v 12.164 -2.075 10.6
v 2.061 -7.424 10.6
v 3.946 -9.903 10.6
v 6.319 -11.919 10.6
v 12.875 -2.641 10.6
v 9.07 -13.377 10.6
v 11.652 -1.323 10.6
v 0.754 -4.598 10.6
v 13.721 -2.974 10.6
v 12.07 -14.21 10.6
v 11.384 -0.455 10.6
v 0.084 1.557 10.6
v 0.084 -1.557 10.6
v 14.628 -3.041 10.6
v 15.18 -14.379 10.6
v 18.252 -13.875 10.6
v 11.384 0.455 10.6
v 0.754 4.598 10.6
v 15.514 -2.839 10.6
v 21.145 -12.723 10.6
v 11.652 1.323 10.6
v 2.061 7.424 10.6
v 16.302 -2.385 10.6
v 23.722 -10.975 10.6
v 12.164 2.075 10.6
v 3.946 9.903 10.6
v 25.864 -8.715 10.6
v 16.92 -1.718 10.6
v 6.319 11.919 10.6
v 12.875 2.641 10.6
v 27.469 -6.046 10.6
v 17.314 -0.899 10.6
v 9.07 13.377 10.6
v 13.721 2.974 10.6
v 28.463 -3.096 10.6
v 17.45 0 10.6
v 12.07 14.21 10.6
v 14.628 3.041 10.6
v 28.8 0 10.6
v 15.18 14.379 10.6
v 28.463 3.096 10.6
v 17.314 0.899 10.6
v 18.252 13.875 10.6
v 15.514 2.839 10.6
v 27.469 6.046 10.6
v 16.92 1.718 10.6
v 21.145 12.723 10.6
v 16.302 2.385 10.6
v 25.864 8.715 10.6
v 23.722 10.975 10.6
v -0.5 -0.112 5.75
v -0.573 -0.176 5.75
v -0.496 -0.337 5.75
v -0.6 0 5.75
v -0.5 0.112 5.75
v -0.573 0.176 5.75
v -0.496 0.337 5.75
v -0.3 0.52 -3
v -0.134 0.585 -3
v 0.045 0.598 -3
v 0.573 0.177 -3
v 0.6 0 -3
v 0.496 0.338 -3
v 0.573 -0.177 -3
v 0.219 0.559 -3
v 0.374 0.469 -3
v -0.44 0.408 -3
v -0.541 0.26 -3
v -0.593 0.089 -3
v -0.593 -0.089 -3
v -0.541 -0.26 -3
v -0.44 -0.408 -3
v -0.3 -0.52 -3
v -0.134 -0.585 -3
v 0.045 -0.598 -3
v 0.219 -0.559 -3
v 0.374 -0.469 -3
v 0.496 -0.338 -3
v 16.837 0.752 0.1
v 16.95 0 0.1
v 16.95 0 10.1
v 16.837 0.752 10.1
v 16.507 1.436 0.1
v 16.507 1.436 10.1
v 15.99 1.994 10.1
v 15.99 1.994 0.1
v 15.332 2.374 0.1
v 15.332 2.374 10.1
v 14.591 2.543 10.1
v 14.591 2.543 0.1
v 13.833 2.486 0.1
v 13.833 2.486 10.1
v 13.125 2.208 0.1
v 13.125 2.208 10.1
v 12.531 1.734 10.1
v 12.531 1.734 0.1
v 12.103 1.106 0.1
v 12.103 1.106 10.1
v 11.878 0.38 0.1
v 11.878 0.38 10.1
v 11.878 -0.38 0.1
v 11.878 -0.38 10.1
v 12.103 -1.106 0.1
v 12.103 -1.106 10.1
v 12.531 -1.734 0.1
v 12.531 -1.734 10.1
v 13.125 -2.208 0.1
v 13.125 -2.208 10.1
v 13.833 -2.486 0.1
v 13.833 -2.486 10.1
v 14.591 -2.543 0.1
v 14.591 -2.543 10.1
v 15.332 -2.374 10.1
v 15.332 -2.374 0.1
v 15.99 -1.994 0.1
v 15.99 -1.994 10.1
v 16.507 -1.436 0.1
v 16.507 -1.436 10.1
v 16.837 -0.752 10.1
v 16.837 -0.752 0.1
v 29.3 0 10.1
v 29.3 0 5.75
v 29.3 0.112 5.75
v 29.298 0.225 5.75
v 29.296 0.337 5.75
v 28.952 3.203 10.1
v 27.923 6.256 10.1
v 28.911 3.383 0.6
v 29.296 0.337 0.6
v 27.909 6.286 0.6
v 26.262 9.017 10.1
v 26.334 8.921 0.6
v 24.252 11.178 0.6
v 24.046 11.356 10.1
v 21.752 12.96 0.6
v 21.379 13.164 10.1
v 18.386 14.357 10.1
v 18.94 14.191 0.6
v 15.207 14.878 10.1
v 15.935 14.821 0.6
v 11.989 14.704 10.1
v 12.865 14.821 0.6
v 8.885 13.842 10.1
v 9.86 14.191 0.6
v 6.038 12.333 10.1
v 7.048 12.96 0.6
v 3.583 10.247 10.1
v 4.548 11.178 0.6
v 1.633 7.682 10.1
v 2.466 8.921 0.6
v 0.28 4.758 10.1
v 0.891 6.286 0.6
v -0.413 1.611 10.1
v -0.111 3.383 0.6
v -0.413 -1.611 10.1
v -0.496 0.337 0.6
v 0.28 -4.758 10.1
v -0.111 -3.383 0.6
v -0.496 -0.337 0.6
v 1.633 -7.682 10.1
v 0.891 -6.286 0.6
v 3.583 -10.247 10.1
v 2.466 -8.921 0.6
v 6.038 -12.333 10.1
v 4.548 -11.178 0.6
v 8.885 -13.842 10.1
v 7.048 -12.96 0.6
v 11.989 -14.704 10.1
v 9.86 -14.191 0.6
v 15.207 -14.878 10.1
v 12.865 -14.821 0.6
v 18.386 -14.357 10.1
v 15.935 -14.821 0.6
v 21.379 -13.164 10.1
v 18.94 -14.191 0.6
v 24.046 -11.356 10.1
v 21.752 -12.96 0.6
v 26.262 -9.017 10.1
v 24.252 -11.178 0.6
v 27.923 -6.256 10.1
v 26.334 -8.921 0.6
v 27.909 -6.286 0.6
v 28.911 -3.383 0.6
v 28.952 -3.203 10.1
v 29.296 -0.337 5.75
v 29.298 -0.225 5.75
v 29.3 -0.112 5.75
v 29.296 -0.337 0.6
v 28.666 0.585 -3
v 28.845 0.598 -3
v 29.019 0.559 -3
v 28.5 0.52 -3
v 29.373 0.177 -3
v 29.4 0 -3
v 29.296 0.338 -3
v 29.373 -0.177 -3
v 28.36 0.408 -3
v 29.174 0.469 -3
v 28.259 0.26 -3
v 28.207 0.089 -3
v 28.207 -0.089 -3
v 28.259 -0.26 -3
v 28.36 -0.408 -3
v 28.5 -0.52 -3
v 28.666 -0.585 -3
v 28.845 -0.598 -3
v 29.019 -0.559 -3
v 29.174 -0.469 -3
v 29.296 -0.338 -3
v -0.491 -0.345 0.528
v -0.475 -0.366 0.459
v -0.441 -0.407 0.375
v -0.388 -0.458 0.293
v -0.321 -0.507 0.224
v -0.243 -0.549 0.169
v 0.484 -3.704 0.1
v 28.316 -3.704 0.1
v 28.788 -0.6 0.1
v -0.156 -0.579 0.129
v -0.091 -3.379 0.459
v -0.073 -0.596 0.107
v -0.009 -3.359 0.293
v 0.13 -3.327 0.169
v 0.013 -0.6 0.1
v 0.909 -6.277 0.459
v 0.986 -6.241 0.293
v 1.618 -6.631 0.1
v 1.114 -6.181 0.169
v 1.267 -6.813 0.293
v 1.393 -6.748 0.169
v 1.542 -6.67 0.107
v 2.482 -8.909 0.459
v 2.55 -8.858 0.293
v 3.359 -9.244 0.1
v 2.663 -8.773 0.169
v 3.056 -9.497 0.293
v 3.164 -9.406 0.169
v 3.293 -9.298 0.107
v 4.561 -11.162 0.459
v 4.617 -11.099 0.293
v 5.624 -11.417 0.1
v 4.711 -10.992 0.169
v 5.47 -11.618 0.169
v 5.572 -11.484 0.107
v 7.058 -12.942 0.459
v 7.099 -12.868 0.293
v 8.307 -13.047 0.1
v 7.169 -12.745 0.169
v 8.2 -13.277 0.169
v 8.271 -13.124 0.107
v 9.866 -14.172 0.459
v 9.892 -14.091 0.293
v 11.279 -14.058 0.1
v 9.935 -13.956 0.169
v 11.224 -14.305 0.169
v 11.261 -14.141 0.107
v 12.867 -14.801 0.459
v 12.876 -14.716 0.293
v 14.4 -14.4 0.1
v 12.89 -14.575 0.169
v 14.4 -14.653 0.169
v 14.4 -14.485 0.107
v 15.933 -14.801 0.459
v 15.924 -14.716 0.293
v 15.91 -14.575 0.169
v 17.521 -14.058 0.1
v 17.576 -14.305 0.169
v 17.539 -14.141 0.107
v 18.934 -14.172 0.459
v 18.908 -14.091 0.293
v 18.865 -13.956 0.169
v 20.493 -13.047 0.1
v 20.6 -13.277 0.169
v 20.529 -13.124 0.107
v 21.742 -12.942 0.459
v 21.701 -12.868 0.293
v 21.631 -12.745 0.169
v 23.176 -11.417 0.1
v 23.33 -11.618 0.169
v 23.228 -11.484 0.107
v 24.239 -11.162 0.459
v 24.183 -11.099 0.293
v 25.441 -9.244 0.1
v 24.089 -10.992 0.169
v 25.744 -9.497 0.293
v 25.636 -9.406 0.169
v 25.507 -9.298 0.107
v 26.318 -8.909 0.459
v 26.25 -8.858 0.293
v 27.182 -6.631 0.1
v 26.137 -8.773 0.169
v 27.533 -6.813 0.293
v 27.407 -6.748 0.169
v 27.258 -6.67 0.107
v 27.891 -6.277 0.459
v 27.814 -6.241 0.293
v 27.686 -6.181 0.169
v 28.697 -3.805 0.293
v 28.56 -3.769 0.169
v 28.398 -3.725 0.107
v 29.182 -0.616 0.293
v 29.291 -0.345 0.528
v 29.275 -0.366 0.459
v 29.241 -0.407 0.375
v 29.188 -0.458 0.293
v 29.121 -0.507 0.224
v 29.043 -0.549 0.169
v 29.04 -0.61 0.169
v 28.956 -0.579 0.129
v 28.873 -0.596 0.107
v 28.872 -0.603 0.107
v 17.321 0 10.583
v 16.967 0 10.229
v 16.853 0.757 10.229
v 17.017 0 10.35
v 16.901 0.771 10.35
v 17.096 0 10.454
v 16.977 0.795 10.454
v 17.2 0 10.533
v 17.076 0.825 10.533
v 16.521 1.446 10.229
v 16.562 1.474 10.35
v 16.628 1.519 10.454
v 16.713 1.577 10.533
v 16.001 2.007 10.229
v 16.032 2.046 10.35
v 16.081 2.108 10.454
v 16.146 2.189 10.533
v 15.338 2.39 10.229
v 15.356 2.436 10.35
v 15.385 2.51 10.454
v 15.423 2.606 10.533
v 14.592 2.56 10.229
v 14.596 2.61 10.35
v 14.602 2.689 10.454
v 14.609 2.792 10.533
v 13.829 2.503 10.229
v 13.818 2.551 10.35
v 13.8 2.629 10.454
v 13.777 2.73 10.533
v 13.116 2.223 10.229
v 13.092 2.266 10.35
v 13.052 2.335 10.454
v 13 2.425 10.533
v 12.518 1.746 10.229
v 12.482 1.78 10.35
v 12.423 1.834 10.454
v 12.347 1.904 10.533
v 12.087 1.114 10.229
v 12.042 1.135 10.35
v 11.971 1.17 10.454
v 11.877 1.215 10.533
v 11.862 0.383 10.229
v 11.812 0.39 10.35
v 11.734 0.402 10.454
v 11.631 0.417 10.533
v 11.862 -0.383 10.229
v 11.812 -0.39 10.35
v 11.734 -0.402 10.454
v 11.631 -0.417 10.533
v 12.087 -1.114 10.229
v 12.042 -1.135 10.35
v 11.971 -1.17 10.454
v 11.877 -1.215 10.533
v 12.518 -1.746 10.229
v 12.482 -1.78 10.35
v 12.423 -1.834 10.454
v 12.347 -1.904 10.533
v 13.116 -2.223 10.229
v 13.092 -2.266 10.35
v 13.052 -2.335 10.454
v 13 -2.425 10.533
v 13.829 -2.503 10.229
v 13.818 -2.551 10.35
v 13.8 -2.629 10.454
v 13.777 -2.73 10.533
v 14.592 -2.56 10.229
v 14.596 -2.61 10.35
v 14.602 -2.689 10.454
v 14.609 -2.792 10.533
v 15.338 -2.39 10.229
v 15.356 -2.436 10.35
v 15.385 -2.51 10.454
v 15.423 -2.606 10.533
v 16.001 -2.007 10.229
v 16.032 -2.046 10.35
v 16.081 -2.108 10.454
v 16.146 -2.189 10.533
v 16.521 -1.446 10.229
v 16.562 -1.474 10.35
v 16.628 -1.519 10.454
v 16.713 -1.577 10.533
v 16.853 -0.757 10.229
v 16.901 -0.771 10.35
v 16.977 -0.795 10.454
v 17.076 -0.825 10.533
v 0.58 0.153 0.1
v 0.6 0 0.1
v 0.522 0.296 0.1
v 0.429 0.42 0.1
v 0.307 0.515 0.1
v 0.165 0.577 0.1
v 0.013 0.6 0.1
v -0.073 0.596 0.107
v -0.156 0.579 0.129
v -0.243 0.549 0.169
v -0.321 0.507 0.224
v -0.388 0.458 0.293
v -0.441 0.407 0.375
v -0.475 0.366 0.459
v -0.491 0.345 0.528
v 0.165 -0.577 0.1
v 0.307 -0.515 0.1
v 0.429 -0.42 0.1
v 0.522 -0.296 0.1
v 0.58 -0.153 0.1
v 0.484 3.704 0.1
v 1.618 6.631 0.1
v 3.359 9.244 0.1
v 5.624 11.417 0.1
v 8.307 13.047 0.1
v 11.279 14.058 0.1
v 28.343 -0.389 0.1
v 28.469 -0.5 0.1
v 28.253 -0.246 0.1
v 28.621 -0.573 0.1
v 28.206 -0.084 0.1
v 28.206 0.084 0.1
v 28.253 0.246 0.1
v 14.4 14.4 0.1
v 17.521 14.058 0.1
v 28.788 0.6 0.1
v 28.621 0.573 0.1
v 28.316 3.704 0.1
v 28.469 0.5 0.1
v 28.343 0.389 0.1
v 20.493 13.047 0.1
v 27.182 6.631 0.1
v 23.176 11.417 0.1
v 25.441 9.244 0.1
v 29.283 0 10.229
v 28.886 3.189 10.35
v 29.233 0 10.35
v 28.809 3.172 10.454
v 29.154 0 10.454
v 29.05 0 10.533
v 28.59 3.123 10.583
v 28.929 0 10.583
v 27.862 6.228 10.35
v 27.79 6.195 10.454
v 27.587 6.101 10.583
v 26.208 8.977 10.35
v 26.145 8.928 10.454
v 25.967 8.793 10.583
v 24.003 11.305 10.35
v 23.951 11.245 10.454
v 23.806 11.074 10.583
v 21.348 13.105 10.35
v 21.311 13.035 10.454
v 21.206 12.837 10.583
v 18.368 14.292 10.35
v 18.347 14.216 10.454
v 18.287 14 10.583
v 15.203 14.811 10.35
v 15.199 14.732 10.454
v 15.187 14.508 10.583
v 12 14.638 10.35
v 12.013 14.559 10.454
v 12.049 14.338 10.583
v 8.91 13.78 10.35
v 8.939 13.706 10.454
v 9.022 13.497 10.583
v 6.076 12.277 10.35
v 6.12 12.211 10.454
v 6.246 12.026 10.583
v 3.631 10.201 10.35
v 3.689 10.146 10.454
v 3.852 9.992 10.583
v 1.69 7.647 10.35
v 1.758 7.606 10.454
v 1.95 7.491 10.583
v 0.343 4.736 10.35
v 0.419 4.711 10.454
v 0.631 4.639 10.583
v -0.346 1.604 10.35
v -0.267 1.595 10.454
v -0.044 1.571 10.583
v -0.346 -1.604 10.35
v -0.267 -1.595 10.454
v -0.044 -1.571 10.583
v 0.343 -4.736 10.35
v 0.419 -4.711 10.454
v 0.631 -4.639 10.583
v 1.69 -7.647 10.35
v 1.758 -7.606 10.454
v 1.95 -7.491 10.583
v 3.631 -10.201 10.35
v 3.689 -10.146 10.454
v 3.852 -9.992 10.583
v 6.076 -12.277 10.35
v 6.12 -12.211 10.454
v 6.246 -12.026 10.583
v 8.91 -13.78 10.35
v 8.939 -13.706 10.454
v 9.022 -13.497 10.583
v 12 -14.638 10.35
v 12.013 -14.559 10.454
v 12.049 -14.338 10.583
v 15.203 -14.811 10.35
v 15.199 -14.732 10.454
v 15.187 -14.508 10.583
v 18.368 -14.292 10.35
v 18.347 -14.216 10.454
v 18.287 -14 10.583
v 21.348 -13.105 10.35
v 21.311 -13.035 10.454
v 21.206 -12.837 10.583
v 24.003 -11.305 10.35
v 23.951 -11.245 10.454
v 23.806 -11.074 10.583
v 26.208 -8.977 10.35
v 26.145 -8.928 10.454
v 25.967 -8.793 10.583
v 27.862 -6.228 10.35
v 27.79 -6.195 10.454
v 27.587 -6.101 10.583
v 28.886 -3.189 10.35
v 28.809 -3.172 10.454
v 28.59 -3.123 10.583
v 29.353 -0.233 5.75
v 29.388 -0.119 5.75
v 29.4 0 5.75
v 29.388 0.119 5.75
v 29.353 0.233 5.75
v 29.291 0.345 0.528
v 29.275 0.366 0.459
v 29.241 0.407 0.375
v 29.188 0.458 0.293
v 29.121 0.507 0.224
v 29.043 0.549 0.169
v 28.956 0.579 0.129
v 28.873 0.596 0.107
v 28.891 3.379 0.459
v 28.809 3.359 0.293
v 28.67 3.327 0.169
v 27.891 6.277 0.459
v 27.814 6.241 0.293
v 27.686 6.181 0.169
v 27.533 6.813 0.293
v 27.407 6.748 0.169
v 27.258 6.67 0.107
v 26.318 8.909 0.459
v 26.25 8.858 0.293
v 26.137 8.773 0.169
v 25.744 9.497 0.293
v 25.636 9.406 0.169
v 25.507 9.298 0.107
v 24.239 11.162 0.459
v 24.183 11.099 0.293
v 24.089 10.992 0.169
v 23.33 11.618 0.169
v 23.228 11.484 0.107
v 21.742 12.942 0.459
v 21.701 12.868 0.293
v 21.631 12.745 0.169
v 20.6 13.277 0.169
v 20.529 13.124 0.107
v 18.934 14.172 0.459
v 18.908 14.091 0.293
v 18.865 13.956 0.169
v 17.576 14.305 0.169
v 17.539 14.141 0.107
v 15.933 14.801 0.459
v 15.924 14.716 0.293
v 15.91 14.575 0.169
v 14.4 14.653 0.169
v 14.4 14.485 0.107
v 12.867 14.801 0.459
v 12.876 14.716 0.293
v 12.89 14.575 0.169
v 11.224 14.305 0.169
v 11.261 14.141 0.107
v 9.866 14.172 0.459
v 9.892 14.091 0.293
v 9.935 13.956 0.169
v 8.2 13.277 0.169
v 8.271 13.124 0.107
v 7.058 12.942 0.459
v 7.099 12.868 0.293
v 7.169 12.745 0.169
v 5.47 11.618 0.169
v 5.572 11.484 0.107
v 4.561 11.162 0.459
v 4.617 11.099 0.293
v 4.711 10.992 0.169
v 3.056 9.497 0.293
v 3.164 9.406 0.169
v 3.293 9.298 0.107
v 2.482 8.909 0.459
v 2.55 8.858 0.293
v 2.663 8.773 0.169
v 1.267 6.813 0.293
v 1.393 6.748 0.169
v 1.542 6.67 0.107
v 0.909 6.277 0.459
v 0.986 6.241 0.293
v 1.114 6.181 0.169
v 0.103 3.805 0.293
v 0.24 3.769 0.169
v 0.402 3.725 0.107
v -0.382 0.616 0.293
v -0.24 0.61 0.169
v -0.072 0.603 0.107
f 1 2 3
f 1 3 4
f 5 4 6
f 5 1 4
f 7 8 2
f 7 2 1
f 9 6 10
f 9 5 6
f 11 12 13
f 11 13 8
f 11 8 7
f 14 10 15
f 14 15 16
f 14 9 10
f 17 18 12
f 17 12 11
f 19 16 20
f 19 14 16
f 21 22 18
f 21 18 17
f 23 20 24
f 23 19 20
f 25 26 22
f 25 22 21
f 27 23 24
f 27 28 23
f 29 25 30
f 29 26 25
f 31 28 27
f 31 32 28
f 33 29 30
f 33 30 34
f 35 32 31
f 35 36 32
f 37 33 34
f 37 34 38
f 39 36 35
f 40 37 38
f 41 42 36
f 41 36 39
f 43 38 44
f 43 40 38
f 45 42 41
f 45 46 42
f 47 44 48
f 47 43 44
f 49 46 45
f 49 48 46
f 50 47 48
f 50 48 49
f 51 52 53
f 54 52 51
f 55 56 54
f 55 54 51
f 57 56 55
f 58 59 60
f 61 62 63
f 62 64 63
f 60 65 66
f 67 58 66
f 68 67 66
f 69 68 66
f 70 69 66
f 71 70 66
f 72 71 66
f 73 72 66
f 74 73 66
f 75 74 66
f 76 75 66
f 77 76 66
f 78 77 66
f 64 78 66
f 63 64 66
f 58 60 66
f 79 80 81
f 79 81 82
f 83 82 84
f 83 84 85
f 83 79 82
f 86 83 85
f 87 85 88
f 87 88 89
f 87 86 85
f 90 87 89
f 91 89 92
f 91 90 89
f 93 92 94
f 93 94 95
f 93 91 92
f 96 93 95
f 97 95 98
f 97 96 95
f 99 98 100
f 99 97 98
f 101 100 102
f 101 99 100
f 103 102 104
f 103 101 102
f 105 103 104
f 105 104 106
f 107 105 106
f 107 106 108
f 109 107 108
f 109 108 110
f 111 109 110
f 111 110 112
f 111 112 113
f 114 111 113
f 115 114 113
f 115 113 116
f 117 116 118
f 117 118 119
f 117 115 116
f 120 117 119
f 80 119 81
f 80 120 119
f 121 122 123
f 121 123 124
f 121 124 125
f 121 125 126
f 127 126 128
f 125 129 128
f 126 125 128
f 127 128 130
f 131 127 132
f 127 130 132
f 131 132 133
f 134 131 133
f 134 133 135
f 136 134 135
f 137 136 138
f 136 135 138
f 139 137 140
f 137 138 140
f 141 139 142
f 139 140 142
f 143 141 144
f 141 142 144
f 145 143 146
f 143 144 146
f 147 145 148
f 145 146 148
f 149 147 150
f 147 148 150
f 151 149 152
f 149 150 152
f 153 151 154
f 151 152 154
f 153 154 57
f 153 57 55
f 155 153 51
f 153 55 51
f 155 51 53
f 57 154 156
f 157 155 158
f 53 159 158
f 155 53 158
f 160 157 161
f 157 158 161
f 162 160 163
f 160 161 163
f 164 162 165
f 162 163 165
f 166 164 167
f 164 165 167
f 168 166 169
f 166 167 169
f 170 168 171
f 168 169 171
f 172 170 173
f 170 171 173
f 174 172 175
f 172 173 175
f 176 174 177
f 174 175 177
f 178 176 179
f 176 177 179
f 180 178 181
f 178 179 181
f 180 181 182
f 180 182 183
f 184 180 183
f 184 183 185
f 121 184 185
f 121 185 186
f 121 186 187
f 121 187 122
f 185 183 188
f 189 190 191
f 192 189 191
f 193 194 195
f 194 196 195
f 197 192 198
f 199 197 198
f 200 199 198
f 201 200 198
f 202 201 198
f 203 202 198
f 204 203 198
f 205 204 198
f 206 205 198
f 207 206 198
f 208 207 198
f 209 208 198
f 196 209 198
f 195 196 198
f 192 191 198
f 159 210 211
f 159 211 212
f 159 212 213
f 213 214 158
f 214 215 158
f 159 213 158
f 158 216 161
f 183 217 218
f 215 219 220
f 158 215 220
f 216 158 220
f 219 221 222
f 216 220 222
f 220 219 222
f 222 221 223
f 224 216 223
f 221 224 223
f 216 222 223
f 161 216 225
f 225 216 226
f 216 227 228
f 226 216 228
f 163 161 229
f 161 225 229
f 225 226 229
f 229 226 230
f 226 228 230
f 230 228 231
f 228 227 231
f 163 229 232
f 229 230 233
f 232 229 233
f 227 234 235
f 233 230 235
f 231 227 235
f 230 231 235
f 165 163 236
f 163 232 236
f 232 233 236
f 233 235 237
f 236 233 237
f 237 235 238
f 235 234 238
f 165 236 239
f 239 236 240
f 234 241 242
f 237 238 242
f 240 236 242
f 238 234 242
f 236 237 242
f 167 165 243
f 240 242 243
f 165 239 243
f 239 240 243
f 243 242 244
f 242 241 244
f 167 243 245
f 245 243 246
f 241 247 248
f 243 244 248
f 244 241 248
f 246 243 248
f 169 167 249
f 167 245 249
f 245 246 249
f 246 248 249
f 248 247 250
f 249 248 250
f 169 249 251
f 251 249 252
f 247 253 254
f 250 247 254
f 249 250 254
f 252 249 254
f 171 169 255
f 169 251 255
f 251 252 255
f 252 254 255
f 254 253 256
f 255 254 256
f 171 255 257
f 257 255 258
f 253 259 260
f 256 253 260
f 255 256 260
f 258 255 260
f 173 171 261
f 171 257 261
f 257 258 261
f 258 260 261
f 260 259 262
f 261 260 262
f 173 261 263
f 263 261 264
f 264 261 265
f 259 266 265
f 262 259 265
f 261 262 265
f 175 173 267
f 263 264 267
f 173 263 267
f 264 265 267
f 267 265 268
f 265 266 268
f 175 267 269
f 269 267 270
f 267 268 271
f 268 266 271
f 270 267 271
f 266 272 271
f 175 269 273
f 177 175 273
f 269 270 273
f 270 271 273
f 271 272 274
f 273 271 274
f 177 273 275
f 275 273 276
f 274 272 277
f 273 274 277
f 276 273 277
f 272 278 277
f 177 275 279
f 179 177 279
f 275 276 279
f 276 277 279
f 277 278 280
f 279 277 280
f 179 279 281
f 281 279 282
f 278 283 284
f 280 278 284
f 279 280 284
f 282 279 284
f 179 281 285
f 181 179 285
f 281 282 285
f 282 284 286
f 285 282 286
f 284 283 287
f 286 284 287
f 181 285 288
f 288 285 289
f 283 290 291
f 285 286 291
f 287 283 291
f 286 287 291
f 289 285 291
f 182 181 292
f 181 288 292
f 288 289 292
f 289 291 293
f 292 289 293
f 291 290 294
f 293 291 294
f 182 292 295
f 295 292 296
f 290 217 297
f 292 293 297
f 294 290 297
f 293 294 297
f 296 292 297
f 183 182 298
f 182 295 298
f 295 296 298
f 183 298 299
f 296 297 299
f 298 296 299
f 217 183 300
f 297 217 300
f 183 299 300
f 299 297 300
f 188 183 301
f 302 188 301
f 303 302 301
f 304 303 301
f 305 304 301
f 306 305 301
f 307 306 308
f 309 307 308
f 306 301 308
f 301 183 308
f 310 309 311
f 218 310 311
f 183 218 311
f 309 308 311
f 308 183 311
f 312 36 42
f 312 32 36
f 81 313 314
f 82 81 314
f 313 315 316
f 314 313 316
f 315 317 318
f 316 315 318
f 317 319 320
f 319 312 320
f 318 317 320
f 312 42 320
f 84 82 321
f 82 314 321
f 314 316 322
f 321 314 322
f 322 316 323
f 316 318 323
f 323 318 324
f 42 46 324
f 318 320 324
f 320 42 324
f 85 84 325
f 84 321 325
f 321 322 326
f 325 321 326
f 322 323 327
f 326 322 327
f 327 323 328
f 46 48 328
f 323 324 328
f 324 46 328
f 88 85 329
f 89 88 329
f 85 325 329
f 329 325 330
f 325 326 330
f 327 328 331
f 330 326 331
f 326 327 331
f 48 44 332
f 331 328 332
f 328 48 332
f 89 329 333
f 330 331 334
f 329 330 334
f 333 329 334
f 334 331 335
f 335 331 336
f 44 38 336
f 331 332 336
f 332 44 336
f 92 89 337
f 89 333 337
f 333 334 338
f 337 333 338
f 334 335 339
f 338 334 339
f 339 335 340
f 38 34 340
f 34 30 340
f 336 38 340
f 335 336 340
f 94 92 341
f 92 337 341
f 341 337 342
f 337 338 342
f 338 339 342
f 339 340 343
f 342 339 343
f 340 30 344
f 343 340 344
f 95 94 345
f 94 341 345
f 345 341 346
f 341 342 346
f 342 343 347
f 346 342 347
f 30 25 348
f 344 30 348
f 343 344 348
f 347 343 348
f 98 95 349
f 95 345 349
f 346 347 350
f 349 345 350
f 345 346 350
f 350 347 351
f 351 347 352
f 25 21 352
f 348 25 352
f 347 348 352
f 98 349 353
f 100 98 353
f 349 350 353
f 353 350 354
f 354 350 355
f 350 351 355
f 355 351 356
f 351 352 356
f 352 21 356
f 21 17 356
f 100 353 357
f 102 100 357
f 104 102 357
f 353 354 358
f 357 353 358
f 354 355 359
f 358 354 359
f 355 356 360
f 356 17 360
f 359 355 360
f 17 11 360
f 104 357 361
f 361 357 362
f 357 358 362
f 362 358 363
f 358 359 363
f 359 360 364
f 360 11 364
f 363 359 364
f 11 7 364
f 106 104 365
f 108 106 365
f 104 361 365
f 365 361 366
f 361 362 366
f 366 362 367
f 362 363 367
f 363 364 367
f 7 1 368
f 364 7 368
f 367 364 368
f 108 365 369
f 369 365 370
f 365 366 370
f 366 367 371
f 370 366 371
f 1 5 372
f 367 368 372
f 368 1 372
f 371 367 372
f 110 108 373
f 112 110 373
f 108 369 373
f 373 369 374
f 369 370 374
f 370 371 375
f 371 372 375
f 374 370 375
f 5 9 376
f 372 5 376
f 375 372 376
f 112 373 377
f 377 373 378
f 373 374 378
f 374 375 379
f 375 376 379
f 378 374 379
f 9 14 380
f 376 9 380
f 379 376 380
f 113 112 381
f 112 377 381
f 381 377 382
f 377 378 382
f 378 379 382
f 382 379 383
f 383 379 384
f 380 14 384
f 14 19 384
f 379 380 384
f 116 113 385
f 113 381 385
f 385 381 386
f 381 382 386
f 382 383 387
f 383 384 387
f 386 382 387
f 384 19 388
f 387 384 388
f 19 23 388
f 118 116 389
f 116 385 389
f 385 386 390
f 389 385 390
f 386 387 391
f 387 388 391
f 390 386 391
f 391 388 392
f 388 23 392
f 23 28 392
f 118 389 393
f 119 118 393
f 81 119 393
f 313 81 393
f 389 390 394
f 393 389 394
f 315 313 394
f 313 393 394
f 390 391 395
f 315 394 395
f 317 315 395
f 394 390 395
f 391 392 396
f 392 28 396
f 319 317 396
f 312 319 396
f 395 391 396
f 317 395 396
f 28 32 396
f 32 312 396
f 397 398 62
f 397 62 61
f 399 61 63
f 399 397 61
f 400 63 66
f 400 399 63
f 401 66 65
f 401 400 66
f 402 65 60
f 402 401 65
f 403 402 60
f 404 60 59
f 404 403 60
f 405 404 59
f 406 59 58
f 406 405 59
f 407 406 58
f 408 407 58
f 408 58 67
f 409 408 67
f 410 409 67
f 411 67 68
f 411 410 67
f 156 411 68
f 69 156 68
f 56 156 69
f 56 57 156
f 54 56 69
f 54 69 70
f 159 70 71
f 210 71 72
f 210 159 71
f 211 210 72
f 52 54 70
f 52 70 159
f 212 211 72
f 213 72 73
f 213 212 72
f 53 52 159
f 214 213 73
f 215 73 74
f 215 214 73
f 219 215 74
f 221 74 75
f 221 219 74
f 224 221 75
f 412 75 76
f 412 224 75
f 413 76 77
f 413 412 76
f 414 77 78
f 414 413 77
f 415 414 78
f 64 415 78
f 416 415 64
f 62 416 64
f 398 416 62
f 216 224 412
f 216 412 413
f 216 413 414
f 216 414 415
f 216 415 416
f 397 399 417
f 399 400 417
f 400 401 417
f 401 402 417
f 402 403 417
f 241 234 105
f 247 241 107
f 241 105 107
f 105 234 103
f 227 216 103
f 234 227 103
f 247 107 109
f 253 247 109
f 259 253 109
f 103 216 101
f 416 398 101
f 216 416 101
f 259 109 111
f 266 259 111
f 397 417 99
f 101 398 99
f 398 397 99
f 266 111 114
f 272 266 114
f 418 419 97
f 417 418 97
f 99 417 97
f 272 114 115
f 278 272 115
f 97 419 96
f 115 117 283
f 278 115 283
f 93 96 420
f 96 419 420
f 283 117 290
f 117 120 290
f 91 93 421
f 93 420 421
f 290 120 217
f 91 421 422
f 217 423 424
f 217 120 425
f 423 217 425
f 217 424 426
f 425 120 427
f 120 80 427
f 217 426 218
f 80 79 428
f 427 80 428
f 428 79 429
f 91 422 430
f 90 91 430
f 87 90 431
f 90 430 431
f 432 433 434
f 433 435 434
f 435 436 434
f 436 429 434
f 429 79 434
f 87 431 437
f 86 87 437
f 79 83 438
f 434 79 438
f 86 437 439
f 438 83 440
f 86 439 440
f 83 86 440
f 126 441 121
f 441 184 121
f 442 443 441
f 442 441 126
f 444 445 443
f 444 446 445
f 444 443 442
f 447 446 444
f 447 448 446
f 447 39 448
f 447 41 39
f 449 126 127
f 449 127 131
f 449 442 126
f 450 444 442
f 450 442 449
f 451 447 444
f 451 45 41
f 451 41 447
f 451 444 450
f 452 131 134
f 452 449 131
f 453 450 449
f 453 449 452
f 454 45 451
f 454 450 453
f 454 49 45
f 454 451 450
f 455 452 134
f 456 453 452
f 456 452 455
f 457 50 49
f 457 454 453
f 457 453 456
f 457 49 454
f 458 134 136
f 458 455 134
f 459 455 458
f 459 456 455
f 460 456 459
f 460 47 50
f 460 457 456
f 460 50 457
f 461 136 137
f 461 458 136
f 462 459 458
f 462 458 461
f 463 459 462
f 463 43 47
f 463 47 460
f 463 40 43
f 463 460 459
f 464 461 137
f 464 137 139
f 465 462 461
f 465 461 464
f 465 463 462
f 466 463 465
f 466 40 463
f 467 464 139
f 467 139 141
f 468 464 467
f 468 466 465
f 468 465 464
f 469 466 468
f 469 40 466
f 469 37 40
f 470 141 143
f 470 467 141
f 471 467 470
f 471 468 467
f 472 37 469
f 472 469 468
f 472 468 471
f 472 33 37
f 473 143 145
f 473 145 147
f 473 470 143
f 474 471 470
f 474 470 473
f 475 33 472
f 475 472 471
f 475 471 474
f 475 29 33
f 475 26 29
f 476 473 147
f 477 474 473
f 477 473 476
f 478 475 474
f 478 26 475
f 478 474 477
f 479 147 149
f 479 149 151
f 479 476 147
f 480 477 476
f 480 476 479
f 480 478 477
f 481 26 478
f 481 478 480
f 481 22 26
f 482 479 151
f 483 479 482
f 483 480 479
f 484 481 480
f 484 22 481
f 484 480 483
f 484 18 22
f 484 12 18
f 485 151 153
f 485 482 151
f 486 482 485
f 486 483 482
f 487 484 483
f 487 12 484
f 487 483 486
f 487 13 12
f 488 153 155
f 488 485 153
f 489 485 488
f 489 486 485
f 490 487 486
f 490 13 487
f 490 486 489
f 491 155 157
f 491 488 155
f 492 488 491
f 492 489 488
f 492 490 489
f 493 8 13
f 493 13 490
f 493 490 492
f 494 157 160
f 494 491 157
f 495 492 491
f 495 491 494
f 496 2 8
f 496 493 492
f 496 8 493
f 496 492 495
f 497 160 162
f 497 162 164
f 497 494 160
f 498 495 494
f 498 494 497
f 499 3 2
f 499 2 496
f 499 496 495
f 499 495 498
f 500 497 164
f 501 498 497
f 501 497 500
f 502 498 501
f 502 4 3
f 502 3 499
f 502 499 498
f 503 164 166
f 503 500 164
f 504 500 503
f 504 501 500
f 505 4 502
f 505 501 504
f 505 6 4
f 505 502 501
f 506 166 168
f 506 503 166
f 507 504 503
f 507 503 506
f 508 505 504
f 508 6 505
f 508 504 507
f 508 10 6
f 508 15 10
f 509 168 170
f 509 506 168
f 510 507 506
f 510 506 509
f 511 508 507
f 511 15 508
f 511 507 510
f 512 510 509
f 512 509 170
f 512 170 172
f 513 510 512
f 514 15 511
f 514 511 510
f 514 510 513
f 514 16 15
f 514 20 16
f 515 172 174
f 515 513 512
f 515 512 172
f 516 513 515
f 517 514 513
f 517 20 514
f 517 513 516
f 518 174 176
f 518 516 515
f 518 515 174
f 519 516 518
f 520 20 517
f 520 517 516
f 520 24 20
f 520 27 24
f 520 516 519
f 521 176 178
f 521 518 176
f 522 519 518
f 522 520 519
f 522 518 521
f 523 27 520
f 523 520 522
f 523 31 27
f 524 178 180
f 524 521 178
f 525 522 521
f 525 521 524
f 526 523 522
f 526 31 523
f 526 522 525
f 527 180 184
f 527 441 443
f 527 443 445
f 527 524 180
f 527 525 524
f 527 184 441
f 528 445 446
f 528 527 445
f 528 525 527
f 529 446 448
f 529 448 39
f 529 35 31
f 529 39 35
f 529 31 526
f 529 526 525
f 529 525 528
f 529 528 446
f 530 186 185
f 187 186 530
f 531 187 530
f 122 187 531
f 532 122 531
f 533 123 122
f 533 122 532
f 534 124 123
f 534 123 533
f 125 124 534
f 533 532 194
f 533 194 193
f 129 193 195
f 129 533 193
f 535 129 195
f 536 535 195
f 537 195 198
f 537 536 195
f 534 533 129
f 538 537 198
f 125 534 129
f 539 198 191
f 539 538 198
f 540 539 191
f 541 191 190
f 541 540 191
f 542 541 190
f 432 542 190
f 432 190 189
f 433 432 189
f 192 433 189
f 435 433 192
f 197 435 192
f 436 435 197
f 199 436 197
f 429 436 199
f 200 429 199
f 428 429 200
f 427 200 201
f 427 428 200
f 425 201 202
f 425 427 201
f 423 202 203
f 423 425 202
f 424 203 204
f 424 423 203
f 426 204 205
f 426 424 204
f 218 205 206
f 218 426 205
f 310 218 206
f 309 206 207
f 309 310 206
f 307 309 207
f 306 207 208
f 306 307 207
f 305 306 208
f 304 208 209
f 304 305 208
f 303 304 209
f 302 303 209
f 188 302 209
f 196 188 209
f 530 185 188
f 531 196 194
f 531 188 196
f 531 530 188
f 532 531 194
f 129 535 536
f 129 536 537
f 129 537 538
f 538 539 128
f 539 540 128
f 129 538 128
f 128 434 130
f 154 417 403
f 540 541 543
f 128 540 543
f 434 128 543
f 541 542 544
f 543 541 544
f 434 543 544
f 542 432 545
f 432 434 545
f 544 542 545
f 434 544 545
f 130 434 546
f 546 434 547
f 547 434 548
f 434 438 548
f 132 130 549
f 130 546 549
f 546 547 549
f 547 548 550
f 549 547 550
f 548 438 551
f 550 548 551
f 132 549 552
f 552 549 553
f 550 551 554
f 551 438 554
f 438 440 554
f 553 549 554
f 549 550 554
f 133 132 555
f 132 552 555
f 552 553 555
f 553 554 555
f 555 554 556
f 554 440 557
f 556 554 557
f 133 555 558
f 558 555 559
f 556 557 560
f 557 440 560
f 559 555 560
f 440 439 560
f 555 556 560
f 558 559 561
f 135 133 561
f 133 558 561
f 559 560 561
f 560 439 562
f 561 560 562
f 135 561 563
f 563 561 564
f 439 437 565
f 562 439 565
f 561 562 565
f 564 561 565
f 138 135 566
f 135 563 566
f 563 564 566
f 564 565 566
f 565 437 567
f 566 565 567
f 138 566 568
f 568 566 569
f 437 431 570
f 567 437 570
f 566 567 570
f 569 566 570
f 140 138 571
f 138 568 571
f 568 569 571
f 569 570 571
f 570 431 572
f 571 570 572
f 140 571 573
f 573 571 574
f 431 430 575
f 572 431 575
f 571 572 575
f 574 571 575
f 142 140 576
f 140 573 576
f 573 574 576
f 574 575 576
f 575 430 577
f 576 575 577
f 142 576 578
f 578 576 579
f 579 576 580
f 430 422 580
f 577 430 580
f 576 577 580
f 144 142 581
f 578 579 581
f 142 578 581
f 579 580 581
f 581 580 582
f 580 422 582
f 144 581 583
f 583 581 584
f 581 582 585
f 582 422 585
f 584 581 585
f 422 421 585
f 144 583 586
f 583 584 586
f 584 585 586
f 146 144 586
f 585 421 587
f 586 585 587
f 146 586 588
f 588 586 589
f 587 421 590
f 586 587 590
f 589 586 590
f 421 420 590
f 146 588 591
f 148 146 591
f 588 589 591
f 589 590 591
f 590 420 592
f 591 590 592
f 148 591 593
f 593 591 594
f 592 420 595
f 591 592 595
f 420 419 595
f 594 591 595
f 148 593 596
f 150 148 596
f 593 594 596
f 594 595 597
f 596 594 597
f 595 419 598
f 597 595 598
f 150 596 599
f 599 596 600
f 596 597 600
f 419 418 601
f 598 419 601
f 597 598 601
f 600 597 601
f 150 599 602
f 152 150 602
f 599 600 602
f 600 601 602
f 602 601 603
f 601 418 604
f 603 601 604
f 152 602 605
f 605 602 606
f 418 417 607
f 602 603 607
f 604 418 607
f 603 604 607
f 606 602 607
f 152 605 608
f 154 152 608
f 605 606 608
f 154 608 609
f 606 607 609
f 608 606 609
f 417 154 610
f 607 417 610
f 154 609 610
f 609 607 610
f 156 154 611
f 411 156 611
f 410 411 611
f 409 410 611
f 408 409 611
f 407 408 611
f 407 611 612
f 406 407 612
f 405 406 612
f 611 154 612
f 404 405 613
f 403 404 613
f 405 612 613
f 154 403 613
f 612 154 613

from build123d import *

# Parameters (mm, degrees)
SKETCH_R          = 14.9
SKETCH_R_2        = 2.55
PAD_DEPTH         = 10.5
FILLET_R          = 0.5
SKETCH001_R       = 0.6
PAD001_DEPTH      = 5.25
PAD001_DEPTH_BACK = 3.5


with BuildPart() as fillet_body:
    # Sketch → Pad (new body)
    with BuildSketch(Plane.XY.offset(0.1)):
        with Locations((14.4, 0)):
            Circle(SKETCH_R)
        with Locations((14.4, 0)):
            Circle(SKETCH_R_2, mode=Mode.SUBTRACT)
    extrude(amount=PAD_DEPTH)

    # Fillet
    fillet_edges = [fillet_body.edges().sort_by_distance(p)[0] for p in [
        (11.85, 0, 10.6),
        (-0.5, 0, 10.6),
        (-0.5, 0, 0.1),
    ]]
    fillet(fillet_edges, radius=FILLET_R)


with BuildPart() as pad001_mp_cp:
    # Sketch001 → Pad001 (new body, two sides)
    with BuildSketch(Plane.XY.offset(0.5)) as pad001_sk:
        Circle(SKETCH001_R)
        with Locations((28.8, 0)):
            Circle(SKETCH001_R)
    extrude(amount=PAD001_DEPTH)
    extrude(pad001_sk.sketch, amount=-PAD001_DEPTH_BACK)

    # Pad001_mp_cp: union Fillet body
    add(fillet_body.part)


solid = pad001_mp_cp.part
